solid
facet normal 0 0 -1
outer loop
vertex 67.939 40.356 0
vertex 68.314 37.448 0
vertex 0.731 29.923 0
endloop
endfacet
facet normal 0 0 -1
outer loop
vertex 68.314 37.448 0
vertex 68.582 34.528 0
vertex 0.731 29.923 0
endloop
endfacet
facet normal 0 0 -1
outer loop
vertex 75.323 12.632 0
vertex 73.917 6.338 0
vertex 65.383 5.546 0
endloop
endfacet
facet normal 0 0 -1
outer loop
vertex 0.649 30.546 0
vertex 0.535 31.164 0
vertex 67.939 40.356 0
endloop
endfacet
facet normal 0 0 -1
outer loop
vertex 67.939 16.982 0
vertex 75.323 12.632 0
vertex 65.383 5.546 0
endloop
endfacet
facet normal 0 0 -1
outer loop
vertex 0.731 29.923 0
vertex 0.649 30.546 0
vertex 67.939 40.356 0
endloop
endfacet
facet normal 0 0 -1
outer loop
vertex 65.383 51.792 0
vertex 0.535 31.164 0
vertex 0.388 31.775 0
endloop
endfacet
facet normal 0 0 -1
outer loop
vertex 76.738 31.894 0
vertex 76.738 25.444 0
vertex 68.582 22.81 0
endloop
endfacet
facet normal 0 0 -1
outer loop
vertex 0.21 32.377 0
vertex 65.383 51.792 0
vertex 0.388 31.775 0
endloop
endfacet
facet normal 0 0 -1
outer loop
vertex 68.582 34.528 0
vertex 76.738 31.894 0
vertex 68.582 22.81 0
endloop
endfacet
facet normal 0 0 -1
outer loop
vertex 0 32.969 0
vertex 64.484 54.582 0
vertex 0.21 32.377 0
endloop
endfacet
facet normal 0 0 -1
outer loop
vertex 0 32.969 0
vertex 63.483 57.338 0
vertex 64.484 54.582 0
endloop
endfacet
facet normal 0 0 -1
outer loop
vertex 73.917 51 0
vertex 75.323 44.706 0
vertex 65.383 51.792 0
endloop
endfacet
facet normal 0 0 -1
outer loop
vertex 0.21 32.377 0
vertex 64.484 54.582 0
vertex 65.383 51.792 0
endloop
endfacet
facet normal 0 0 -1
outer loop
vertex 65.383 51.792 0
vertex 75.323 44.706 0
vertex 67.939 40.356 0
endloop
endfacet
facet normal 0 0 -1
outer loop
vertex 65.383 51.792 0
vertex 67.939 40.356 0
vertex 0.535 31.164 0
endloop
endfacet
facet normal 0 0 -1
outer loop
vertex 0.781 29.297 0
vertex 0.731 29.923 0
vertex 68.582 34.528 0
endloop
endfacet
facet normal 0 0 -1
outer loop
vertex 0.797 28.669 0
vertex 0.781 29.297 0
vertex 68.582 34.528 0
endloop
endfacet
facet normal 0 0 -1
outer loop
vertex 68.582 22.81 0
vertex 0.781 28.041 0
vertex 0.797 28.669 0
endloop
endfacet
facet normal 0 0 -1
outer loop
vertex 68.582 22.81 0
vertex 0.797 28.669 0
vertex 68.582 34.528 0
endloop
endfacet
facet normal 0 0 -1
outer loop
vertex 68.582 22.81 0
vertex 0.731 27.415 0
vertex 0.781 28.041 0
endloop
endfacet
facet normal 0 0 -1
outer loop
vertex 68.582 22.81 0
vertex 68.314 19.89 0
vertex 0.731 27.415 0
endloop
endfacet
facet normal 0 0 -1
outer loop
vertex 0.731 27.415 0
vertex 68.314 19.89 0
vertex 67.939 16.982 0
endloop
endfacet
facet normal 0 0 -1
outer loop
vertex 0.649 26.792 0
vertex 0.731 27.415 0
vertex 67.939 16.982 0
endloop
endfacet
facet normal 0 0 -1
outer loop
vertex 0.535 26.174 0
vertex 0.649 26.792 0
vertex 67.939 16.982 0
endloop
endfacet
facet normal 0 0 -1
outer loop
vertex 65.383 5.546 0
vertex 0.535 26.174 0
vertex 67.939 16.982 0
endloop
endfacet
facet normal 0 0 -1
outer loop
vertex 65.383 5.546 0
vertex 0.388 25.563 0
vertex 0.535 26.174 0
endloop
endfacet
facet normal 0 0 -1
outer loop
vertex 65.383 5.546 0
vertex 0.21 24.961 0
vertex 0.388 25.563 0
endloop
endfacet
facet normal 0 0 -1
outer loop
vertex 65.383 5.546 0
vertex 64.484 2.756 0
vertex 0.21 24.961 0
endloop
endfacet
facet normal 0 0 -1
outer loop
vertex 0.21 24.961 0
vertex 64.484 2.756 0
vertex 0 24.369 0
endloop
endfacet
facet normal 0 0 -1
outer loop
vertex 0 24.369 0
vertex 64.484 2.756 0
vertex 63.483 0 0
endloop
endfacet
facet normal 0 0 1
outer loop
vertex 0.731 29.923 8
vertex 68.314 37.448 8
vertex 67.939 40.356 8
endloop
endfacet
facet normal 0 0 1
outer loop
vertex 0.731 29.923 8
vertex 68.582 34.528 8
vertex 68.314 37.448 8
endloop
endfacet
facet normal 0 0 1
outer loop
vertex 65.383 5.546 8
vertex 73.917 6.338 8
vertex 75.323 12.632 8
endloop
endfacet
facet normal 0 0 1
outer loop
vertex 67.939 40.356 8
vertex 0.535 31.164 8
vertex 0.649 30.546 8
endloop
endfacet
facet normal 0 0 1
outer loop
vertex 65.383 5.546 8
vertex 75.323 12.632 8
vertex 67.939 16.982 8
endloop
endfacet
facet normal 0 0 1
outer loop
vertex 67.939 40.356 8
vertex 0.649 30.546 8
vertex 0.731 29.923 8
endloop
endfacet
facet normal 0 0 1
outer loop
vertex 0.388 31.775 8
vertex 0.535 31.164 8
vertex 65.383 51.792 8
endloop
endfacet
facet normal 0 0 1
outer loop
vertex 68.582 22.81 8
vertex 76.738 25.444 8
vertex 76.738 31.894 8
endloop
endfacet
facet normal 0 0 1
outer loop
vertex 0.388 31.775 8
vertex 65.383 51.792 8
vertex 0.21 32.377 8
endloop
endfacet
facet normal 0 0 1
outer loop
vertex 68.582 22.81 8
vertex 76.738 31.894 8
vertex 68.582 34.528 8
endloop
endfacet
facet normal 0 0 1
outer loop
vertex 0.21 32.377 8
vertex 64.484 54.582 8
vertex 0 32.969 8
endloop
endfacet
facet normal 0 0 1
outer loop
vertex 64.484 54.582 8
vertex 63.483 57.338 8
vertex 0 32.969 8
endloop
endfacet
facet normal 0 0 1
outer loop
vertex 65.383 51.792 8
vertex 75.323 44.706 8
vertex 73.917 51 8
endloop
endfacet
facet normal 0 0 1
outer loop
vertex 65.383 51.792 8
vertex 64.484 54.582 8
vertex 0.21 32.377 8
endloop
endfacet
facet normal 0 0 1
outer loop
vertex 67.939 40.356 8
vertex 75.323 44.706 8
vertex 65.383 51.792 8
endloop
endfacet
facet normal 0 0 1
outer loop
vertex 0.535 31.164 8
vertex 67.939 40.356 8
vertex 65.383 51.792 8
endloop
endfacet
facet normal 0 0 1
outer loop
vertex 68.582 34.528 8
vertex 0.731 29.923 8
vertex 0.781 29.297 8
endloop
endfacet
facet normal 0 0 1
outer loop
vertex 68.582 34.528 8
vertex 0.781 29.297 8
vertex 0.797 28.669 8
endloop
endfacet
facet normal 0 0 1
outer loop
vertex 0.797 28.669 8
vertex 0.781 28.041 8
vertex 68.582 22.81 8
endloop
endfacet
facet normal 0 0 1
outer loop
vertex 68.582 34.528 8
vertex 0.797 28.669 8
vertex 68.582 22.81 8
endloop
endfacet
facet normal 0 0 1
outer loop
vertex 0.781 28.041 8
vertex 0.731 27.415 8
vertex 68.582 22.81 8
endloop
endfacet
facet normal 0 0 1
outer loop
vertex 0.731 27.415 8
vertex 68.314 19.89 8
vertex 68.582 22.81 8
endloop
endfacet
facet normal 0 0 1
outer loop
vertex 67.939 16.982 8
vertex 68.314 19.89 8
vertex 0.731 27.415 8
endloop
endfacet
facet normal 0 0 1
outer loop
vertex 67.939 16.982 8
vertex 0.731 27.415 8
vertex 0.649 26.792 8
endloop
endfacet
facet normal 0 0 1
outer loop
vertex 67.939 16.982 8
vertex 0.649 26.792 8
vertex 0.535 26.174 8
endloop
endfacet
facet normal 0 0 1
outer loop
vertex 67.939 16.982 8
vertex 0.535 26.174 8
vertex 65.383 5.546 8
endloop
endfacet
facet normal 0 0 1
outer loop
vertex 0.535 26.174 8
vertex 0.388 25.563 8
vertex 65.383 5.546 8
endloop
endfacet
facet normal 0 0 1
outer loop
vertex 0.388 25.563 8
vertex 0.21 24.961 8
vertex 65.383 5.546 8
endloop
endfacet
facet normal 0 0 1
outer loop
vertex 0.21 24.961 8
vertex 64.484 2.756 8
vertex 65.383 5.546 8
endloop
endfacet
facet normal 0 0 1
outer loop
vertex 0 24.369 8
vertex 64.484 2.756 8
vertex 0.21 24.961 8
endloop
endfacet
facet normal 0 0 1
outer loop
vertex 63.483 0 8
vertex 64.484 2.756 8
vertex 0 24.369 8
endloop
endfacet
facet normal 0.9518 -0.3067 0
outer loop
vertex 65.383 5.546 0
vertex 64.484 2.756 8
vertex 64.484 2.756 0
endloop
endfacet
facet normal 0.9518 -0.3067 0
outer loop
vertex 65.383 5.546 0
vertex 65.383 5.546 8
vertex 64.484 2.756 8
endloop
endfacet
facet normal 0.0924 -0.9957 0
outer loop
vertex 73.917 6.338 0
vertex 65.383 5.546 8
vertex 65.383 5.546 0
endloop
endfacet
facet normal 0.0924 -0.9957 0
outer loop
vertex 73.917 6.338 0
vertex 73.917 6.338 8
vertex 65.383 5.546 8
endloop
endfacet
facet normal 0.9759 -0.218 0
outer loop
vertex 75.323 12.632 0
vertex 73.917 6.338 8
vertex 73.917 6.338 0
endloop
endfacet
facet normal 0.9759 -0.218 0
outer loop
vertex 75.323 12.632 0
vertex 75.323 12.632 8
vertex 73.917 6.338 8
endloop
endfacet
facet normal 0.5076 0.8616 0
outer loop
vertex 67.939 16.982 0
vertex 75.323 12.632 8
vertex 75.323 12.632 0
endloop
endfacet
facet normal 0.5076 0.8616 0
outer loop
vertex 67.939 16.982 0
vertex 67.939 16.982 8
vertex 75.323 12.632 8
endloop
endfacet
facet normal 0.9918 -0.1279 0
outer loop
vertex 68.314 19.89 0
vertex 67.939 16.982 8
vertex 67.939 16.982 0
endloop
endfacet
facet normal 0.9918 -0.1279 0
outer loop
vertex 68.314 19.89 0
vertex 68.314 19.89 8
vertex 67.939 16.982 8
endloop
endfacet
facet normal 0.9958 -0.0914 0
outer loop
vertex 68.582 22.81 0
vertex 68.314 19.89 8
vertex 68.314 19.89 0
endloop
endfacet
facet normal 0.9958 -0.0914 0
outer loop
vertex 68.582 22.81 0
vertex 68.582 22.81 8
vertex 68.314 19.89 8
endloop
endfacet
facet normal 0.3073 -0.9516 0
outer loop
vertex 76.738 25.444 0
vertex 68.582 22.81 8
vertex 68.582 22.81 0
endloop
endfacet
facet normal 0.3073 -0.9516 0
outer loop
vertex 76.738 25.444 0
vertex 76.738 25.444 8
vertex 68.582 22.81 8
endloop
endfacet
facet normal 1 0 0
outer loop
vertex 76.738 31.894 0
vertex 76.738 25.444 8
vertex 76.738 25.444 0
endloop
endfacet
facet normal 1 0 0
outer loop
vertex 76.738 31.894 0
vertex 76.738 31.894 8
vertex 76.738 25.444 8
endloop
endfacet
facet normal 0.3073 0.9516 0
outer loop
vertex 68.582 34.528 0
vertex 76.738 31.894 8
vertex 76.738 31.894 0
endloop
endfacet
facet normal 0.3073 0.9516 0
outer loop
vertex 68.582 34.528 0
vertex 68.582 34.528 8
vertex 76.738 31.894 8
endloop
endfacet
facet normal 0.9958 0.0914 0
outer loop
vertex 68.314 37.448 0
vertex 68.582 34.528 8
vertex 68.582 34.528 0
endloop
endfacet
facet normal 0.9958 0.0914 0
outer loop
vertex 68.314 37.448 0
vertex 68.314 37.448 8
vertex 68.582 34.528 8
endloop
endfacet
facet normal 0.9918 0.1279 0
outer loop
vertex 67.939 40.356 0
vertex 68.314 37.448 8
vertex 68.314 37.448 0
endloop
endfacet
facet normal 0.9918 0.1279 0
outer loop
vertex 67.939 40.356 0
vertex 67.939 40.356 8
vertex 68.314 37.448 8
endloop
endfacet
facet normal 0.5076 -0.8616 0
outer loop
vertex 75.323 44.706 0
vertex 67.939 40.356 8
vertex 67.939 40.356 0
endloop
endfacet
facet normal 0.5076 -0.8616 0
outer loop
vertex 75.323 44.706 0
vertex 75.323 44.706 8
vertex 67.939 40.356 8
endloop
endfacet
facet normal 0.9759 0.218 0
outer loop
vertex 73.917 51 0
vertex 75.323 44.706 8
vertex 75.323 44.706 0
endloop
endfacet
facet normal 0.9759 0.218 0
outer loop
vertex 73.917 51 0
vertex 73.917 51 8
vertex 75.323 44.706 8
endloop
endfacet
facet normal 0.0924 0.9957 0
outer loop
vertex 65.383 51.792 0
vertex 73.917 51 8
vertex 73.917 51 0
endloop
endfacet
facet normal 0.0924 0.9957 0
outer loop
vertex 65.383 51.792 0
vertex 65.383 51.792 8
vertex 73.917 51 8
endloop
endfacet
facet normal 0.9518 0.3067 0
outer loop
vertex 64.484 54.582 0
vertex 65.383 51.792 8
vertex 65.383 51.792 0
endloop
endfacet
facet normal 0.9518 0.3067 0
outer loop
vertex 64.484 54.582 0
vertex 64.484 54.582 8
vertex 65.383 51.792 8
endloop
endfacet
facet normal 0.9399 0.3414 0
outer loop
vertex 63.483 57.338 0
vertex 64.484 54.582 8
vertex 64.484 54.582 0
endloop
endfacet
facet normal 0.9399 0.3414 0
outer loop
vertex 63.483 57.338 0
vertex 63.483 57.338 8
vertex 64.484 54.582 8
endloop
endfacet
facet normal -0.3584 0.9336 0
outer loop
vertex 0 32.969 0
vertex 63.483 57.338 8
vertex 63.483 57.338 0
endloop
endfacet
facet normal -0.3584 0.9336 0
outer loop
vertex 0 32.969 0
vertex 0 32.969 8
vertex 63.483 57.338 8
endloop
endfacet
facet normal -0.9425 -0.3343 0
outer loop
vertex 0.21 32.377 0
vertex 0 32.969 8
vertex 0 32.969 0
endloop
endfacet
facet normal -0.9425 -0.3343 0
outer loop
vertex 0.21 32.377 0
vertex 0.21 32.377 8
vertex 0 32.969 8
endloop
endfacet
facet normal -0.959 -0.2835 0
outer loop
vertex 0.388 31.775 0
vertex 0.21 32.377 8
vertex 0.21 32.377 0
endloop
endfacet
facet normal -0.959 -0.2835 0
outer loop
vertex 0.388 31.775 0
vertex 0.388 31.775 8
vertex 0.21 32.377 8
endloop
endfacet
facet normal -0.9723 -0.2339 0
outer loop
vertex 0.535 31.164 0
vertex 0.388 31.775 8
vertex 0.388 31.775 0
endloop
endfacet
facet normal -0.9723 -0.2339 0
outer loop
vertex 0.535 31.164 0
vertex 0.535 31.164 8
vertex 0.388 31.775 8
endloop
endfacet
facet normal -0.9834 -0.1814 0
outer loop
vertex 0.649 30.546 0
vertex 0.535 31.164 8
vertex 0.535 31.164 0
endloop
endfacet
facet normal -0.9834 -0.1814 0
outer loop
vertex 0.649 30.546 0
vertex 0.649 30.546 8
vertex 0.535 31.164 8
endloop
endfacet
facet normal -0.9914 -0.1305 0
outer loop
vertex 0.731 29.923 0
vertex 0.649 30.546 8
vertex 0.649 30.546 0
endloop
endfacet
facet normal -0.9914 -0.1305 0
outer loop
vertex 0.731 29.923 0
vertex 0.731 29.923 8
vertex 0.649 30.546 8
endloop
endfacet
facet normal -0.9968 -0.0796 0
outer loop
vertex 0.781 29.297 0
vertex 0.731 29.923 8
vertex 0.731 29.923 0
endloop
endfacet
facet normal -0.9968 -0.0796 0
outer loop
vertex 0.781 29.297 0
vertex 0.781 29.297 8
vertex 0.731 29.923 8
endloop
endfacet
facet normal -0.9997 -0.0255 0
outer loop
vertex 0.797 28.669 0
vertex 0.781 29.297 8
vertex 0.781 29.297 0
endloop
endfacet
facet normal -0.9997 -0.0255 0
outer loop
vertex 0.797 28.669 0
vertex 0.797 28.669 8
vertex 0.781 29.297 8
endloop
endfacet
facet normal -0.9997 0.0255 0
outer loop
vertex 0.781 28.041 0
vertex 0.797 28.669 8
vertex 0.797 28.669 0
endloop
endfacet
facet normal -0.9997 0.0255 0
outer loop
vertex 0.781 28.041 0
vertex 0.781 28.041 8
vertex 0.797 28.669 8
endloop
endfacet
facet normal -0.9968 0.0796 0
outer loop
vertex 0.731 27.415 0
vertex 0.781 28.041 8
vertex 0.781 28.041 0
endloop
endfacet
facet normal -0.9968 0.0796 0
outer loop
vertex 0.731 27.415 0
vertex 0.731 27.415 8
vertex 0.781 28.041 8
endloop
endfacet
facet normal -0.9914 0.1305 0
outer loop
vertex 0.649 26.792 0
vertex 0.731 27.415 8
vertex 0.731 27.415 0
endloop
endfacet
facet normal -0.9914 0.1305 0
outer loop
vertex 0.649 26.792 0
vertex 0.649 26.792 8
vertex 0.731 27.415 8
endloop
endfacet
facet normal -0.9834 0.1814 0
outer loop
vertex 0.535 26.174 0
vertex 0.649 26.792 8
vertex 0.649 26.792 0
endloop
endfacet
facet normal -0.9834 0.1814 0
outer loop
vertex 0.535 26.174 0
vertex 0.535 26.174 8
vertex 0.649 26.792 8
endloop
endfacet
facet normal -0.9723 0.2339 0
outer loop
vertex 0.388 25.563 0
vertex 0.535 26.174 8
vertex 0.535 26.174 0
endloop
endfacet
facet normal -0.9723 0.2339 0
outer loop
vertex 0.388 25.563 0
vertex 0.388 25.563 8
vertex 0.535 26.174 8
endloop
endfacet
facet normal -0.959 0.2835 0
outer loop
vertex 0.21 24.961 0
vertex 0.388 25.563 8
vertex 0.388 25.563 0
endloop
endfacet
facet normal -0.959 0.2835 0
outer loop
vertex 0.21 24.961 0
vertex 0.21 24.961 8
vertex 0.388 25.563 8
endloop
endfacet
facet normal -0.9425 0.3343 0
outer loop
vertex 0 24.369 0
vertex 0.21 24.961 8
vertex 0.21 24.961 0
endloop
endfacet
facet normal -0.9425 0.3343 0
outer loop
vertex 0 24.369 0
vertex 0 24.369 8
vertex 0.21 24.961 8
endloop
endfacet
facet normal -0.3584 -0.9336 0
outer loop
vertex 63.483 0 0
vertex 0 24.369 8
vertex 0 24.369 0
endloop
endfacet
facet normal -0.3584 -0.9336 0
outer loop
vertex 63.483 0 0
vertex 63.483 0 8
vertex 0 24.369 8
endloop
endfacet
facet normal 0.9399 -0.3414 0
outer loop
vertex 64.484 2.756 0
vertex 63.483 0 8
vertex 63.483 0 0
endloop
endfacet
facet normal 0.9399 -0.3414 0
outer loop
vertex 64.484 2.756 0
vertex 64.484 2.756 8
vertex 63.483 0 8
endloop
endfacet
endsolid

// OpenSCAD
$fn = 32;

// ----------------------------------------------------------------------
// Gear sector: 3 teeth on 42 degrees
// ----------------------------------------------------------------------

// --- parameters (mm) ---
sector_angle = 42;        // sector angle, degrees
root_r = 80;              // root circle radius
tooth_h = 8;              // tooth height over the root circle
teeth = 3;                // number of teeth on the sector
hub_r = 12;               // hub bore radius
plate_t = 8;              // sector thickness, Z
arc_step = 3;             // sampling step of the root/hub arcs, degrees

tip_r = root_r + tooth_h;  // tip circle radius

profile = [[63.483, 0], [64.484, 2.756], [65.383, 5.546], [73.917, 6.338], [75.323, 12.632], [67.939, 16.982], [68.314, 19.89], [68.582, 22.81], [76.738, 25.444], [76.738, 31.894], [68.582, 34.528], [68.314, 37.448], [67.939, 40.356], [75.323, 44.706], [73.917, 51], [65.383, 51.792], [64.484, 54.582], [63.483, 57.338], [0, 32.969], [0.21, 32.377], [0.388, 31.775], [0.535, 31.164], [0.649, 30.546], [0.731, 29.923], [0.781, 29.297], [0.797, 28.669], [0.781, 28.041], [0.731, 27.415], [0.649, 26.792], [0.535, 26.174], [0.388, 25.563], [0.21, 24.961], [0, 24.369]];  // primary outline, 33 points, counter clockwise

// --- the one profile operation ---
linear_extrude(height = plate_t) polygon(points = profile);
